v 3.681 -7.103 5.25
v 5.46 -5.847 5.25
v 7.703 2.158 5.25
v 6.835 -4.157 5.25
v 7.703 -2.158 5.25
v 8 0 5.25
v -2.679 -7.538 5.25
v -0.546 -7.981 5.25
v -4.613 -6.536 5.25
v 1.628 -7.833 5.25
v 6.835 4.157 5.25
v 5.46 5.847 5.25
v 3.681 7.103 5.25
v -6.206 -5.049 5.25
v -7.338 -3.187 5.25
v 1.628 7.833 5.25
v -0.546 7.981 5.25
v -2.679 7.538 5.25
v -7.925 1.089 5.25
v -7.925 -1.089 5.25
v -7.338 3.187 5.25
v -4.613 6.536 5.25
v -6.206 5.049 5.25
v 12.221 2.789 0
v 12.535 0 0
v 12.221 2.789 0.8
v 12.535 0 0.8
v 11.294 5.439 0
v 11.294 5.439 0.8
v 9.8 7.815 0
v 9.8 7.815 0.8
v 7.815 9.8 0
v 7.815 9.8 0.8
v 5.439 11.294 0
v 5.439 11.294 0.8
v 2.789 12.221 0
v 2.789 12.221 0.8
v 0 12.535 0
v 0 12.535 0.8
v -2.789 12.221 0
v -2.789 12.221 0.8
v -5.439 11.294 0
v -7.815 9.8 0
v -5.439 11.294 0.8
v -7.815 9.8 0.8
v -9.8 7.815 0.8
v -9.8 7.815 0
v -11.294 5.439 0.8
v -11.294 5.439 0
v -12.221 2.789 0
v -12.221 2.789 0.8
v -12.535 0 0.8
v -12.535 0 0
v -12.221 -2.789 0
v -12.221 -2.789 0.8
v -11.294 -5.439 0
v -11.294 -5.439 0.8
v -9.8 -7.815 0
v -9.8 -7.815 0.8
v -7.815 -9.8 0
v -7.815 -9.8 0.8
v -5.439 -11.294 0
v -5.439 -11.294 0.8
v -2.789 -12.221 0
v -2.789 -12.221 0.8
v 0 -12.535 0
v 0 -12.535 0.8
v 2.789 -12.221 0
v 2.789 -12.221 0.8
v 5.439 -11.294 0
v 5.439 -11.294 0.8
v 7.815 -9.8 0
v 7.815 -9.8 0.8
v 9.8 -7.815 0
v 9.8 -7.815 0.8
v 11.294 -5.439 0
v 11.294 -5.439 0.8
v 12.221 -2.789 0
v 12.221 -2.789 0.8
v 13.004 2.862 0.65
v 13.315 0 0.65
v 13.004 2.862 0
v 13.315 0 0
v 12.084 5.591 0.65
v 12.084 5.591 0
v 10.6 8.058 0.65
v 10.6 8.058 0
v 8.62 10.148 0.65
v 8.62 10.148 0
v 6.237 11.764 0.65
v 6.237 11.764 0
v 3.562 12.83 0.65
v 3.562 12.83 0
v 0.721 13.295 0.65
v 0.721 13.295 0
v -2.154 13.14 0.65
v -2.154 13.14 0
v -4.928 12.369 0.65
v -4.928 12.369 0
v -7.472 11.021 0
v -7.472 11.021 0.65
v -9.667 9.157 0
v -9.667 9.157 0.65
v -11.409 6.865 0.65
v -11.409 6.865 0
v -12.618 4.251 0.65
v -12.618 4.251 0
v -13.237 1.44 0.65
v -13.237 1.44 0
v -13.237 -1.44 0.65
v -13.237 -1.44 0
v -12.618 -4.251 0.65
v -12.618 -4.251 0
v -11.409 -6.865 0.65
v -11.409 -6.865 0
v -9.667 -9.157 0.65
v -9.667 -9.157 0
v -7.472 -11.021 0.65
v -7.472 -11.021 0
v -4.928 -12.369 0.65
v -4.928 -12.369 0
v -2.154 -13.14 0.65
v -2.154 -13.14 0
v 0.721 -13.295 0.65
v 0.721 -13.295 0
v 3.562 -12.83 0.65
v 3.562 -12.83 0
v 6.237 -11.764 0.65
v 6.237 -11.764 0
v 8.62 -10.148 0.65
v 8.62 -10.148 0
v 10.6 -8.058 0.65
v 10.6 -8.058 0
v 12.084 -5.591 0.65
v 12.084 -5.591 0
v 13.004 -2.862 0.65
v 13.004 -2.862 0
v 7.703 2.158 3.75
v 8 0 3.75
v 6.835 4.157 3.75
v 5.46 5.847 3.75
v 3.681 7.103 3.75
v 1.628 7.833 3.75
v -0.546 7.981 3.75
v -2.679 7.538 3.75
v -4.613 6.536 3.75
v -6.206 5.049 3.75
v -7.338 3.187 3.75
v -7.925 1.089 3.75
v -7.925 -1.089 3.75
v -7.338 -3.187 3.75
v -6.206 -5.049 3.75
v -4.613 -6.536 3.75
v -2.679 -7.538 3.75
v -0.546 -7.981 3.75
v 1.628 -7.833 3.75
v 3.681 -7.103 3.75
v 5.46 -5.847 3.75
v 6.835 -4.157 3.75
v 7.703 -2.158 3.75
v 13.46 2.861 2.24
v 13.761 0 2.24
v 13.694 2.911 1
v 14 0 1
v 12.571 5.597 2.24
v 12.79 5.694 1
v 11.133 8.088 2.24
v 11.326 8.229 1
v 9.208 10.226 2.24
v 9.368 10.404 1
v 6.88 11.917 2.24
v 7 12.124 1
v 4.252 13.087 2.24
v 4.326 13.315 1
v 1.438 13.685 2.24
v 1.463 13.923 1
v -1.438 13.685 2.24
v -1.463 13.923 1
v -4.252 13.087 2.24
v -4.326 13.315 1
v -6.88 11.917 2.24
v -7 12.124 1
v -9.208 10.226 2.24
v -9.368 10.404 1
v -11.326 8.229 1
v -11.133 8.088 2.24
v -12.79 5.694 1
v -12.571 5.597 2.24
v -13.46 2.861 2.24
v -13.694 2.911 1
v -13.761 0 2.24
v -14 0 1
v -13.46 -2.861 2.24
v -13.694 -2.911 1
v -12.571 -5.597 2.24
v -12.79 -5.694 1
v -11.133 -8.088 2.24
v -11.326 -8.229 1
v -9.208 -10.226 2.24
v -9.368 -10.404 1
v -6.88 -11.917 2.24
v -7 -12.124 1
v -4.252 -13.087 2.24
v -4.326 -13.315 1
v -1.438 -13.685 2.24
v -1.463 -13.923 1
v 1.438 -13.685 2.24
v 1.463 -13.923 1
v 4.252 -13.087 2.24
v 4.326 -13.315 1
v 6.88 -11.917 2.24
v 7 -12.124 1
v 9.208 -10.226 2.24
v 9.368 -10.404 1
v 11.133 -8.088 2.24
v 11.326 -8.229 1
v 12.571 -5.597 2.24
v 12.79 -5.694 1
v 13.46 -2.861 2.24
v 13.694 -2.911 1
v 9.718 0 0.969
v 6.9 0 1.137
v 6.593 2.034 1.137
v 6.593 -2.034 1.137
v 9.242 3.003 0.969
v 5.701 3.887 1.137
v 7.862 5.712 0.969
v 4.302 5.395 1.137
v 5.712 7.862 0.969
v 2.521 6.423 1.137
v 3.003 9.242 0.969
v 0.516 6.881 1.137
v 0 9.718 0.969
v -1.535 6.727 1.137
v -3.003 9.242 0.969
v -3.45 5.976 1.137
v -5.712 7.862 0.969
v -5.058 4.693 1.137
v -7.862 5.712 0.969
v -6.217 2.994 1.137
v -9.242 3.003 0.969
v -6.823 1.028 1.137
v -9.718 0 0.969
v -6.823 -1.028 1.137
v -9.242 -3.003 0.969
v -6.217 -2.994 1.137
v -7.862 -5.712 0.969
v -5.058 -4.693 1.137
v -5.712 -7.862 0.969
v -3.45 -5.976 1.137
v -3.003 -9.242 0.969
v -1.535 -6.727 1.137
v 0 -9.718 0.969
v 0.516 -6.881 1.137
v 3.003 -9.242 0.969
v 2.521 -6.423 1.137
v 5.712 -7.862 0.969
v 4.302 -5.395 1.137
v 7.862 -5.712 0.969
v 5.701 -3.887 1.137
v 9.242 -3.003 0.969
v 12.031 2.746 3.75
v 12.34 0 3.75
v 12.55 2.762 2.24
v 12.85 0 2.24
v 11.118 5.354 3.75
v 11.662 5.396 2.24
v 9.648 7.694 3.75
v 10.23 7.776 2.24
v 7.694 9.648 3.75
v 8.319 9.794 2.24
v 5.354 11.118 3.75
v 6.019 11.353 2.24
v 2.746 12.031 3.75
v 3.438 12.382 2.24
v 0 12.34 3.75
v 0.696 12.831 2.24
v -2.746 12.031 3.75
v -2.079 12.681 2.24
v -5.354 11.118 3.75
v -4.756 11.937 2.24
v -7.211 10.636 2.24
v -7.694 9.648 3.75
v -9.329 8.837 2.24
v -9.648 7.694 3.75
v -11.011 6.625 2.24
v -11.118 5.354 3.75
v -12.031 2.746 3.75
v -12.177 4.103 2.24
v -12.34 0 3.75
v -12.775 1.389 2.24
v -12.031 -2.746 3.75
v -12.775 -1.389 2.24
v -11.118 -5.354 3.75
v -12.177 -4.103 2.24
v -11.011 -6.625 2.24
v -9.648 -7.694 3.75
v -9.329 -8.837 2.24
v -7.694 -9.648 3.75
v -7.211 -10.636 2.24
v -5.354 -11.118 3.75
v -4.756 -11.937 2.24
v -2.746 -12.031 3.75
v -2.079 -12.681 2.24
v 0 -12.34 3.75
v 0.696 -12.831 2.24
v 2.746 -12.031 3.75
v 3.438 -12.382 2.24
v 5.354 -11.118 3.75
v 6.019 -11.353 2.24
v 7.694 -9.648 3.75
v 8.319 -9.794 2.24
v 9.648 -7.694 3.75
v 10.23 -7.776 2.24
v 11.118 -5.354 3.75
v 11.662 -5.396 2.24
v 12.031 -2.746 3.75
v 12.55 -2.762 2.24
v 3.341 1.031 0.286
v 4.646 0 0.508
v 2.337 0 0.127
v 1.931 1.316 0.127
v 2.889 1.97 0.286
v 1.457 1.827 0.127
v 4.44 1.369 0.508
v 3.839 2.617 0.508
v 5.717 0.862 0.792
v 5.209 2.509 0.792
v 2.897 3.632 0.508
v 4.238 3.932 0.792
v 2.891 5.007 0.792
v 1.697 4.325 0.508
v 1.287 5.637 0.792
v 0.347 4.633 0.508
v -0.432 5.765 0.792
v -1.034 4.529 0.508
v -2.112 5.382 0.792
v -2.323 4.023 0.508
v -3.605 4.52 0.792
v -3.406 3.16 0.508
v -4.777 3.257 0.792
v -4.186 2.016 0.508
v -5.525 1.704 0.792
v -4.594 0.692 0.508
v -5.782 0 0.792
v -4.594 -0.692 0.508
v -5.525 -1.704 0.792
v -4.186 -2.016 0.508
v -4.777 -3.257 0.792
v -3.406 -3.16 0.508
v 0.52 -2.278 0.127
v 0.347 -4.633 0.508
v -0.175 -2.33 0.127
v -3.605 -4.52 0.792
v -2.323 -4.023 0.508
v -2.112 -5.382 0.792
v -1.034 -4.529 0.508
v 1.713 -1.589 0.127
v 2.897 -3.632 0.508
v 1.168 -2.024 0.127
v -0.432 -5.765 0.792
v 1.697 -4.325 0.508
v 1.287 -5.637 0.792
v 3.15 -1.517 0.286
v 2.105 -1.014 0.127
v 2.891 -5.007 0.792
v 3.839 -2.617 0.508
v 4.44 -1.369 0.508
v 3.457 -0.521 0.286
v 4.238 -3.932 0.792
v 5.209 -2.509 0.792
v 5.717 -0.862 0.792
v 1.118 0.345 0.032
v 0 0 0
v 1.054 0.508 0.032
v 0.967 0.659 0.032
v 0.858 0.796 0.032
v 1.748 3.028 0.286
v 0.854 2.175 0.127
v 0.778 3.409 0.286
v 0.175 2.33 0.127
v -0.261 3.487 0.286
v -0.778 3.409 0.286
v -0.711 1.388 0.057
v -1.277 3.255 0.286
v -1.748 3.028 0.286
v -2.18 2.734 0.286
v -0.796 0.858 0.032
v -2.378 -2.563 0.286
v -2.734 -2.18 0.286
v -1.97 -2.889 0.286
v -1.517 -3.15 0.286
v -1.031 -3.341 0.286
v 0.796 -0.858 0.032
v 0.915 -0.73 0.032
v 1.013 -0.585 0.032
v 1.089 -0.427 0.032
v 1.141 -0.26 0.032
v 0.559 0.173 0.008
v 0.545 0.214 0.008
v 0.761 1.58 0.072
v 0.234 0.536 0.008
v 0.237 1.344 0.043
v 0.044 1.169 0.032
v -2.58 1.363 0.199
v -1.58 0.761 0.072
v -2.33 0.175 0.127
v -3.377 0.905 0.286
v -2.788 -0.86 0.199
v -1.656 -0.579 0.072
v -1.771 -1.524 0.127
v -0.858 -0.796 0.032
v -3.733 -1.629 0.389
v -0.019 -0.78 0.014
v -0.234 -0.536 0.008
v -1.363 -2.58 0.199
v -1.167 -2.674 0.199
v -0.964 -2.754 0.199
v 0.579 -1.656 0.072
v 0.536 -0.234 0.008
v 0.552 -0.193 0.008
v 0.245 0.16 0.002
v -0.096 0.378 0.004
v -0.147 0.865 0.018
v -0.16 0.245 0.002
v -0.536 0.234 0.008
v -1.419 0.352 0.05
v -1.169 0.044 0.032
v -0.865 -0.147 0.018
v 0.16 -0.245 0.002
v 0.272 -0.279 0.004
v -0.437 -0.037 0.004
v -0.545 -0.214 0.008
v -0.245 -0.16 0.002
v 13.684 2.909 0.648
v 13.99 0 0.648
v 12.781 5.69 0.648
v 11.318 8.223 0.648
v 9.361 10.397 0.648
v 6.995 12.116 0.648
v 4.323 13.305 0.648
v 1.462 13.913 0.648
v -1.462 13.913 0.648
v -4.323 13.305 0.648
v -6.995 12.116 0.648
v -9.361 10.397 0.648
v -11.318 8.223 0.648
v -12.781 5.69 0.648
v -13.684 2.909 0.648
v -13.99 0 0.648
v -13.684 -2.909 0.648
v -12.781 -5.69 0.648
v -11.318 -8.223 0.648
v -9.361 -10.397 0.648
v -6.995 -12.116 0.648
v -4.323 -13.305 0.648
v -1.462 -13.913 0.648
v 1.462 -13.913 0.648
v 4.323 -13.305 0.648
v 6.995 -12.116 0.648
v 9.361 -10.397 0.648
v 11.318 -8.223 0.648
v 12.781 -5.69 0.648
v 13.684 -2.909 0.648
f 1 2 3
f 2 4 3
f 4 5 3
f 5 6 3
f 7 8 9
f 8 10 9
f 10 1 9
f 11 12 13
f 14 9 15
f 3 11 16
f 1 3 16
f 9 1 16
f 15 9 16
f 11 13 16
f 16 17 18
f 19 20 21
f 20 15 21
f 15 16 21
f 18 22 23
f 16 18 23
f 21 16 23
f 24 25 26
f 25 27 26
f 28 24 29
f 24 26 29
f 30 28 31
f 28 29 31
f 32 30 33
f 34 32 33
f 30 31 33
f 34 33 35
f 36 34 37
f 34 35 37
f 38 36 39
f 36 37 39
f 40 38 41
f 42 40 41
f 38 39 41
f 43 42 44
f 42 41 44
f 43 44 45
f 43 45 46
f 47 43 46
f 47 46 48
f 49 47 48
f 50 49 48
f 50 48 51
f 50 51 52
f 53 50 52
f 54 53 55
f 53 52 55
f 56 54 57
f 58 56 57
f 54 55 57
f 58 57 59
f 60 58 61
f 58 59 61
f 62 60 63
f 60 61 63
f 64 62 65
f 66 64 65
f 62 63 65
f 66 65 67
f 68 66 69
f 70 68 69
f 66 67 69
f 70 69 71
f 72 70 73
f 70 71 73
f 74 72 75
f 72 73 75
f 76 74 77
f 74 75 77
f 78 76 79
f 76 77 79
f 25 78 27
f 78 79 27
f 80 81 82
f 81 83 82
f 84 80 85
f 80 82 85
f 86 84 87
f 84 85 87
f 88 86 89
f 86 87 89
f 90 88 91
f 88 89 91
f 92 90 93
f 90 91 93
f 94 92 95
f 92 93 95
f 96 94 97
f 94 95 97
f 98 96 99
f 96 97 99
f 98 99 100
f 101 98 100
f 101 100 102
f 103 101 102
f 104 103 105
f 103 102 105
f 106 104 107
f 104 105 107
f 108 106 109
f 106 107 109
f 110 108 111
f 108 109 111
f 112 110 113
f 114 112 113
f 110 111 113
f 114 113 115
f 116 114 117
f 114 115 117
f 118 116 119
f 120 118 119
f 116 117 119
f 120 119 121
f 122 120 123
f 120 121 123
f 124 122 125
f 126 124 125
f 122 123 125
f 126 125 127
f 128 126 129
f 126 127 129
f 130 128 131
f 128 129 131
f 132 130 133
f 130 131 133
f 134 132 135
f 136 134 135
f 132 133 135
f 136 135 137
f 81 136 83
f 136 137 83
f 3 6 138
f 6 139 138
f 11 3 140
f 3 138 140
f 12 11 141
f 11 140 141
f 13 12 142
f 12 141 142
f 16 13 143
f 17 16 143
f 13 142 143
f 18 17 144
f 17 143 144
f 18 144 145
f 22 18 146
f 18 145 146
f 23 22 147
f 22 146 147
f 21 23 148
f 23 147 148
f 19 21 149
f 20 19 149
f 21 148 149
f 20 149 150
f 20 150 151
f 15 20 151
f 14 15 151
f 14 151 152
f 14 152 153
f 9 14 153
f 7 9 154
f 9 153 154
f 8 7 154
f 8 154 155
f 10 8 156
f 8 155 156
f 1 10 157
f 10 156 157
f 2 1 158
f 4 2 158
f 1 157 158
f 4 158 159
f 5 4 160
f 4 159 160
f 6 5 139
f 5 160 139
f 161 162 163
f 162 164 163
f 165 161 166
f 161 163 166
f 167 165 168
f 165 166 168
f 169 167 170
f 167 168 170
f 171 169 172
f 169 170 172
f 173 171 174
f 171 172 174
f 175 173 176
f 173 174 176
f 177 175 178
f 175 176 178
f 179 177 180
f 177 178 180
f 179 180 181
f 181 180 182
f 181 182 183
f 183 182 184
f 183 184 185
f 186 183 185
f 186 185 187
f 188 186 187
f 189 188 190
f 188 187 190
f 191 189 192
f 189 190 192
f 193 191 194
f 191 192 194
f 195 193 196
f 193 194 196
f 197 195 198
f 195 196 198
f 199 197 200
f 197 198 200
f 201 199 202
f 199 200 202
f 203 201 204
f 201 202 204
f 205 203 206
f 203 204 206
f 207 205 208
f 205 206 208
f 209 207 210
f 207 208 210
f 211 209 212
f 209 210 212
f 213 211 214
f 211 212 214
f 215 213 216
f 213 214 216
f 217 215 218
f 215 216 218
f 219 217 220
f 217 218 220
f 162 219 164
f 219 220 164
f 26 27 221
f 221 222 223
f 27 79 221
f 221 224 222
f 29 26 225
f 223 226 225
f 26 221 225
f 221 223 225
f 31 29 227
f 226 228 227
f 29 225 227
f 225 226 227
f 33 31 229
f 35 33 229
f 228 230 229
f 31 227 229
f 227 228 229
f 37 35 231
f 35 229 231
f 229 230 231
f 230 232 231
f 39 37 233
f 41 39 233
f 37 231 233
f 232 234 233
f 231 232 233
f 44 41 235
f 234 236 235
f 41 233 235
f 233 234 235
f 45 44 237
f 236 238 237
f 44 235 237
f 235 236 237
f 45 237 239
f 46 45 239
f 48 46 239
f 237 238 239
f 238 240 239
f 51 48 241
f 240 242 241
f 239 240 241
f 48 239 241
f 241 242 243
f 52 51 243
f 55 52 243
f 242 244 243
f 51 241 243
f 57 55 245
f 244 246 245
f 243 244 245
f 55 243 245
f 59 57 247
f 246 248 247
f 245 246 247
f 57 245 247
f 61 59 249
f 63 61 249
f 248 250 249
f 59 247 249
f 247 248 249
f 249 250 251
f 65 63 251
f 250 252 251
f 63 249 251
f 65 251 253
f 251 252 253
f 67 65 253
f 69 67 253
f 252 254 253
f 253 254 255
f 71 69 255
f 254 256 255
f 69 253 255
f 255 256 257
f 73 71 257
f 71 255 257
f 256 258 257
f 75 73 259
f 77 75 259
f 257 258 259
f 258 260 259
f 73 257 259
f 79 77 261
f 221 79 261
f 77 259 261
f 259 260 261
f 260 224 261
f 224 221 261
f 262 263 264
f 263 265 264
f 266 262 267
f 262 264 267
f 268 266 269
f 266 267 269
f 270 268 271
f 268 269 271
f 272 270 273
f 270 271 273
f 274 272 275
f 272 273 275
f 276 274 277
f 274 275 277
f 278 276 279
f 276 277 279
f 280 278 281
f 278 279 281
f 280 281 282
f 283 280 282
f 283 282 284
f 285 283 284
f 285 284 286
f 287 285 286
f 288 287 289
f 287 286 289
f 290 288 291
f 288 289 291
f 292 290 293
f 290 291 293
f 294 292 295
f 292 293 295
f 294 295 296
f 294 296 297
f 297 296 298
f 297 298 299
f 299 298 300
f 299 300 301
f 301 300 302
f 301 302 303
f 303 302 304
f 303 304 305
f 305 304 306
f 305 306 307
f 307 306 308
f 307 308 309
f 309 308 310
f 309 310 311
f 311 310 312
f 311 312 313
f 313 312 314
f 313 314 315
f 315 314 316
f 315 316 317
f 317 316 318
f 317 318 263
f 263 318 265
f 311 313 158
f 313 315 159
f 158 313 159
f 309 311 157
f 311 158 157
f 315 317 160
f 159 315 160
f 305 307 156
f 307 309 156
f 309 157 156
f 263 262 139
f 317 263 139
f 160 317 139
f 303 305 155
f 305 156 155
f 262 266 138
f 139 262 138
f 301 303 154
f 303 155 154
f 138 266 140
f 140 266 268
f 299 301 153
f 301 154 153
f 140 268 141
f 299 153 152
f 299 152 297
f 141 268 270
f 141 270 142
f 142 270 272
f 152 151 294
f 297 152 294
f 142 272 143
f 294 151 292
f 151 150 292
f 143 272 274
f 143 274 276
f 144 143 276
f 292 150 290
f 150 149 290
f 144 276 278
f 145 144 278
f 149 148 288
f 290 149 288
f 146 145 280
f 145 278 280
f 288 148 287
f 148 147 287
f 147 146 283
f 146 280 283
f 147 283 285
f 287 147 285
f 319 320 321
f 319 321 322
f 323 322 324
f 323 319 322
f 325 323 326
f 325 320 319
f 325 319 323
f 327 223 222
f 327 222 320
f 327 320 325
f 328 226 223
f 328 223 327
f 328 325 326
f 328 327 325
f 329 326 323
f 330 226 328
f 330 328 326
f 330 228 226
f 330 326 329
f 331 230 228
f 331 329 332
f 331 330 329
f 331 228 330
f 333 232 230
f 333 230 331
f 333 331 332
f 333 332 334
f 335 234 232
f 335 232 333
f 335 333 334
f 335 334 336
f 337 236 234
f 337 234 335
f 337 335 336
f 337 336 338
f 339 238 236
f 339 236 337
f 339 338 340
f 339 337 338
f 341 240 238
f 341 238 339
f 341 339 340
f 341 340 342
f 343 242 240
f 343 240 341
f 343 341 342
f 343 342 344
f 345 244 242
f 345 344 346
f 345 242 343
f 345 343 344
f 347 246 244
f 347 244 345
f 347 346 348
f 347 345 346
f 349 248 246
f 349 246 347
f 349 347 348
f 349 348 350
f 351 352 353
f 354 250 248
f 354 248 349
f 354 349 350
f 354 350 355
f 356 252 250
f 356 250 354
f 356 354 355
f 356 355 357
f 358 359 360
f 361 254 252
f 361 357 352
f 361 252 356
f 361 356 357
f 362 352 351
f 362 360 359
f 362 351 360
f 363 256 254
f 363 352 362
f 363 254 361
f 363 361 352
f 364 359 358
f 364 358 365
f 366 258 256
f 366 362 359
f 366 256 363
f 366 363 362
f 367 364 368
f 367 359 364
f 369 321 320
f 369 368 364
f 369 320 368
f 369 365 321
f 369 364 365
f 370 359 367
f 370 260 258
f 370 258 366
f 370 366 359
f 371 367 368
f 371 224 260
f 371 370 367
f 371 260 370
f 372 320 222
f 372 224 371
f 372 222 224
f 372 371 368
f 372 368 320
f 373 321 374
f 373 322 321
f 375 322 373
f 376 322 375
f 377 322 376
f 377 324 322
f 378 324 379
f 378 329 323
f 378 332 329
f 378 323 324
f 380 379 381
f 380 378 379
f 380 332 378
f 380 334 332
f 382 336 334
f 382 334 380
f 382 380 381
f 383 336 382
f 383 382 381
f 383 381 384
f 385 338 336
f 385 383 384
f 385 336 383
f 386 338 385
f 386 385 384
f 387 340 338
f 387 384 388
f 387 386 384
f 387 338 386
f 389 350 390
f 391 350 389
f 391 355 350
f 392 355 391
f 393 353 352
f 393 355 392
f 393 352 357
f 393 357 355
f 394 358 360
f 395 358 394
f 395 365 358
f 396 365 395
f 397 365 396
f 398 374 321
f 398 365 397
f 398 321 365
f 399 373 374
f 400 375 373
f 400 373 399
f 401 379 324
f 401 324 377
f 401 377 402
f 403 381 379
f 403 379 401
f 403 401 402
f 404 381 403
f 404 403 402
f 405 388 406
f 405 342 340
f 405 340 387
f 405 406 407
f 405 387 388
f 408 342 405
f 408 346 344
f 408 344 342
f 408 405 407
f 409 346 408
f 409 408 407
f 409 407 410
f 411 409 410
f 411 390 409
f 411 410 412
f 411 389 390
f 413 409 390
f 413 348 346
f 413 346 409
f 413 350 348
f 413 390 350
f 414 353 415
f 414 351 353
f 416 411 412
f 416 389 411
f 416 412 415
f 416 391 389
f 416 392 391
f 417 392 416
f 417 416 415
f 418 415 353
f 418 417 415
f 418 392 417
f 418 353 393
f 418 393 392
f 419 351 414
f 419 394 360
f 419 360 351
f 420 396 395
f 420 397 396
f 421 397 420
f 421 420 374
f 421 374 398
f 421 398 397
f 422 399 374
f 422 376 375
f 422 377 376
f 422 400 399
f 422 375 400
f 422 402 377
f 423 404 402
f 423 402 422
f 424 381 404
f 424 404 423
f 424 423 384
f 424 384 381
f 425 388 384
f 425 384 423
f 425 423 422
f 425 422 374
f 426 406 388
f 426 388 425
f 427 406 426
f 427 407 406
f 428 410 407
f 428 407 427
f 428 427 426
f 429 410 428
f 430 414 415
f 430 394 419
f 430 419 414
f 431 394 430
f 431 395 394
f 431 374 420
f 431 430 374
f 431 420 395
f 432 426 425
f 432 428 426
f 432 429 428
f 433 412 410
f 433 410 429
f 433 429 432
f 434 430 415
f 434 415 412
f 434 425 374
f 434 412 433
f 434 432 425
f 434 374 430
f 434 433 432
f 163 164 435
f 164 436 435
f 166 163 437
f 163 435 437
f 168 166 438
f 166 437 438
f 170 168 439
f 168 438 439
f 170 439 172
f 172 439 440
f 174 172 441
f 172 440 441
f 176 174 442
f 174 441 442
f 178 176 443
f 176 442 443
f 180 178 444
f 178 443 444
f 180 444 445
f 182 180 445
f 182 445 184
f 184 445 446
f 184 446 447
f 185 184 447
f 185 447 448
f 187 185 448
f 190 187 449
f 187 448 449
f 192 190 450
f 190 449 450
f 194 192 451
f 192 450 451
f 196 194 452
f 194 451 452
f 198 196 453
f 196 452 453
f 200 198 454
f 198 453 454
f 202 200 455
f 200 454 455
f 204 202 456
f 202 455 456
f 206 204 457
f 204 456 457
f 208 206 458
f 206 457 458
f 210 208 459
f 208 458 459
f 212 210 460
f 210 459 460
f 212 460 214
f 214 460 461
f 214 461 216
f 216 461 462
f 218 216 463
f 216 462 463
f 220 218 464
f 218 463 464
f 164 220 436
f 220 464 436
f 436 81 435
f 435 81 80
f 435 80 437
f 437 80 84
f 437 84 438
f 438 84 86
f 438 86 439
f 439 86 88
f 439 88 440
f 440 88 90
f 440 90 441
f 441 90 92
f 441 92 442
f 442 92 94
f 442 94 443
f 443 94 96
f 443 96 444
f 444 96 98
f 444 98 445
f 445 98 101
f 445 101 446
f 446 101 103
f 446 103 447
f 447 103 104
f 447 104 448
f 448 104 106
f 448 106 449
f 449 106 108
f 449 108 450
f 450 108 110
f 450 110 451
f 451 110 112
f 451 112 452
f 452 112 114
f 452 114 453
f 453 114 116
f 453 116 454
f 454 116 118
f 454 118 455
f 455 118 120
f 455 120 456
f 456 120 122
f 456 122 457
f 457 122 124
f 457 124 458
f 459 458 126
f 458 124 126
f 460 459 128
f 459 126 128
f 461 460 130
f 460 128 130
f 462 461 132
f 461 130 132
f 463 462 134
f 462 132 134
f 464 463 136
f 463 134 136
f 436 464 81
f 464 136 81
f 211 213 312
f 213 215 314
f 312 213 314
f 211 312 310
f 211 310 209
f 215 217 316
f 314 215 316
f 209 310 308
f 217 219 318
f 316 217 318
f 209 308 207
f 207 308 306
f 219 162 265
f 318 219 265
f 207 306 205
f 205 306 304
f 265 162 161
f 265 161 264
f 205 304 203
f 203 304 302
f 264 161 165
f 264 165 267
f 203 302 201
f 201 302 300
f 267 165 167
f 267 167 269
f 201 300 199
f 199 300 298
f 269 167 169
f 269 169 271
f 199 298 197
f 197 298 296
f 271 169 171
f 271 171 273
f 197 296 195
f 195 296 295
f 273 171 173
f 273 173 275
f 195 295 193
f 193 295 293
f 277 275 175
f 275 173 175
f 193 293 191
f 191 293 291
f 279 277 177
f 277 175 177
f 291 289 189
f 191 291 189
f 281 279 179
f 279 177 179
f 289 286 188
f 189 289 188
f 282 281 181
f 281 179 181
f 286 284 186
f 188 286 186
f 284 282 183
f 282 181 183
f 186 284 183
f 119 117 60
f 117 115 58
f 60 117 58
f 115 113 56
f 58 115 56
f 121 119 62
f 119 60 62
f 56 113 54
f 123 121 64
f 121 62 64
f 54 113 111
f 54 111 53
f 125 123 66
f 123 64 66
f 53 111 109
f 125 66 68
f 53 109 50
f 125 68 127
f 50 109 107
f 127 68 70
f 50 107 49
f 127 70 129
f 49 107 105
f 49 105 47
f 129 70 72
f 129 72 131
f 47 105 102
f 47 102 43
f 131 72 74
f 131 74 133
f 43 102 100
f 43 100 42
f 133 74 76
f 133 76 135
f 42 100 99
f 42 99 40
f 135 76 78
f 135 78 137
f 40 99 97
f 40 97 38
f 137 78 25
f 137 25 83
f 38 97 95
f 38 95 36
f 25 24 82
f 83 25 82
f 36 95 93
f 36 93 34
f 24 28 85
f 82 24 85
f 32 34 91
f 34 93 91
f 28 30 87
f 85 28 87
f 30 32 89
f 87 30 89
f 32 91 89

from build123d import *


with BuildPart() as part:
    # Sketch → Revolution (revolve)
    with BuildSketch(Plane.XZ):
        with BuildLine():
            Line((0, 5.25), (8, 5.25))
            Line((8, 5.25), (8, 3.75))
            Line((8, 3.75), (12.34, 3.75))
            Line((12.34, 3.75), (12.85, 2.24))
            Line((12.85, 2.24), (13.760654, 2.24))
            Line((13.760654, 2.24), (14, 1))
            Line((14, 1), (13.99, 0.648005))
            Line((13.99, 0.648005), (13.315, 0.65))
            Line((13.315, 0.65), (13.315, 0))
            Line((13.315, 0), (12.535, 0))
            Line((12.535, 0), (12.535, 0.8))
            Line((12.535, 0.8), (6.9, 1.137238))
            ThreePointArc((0, 0), (3.496546, 0.286211), (6.9, 1.137238))
            Line((0, 0), (0, 5.25))
        make_face()
    revolve(axis=Axis((0, 0, 0), (0, 0, 1)))


solid = part.part
